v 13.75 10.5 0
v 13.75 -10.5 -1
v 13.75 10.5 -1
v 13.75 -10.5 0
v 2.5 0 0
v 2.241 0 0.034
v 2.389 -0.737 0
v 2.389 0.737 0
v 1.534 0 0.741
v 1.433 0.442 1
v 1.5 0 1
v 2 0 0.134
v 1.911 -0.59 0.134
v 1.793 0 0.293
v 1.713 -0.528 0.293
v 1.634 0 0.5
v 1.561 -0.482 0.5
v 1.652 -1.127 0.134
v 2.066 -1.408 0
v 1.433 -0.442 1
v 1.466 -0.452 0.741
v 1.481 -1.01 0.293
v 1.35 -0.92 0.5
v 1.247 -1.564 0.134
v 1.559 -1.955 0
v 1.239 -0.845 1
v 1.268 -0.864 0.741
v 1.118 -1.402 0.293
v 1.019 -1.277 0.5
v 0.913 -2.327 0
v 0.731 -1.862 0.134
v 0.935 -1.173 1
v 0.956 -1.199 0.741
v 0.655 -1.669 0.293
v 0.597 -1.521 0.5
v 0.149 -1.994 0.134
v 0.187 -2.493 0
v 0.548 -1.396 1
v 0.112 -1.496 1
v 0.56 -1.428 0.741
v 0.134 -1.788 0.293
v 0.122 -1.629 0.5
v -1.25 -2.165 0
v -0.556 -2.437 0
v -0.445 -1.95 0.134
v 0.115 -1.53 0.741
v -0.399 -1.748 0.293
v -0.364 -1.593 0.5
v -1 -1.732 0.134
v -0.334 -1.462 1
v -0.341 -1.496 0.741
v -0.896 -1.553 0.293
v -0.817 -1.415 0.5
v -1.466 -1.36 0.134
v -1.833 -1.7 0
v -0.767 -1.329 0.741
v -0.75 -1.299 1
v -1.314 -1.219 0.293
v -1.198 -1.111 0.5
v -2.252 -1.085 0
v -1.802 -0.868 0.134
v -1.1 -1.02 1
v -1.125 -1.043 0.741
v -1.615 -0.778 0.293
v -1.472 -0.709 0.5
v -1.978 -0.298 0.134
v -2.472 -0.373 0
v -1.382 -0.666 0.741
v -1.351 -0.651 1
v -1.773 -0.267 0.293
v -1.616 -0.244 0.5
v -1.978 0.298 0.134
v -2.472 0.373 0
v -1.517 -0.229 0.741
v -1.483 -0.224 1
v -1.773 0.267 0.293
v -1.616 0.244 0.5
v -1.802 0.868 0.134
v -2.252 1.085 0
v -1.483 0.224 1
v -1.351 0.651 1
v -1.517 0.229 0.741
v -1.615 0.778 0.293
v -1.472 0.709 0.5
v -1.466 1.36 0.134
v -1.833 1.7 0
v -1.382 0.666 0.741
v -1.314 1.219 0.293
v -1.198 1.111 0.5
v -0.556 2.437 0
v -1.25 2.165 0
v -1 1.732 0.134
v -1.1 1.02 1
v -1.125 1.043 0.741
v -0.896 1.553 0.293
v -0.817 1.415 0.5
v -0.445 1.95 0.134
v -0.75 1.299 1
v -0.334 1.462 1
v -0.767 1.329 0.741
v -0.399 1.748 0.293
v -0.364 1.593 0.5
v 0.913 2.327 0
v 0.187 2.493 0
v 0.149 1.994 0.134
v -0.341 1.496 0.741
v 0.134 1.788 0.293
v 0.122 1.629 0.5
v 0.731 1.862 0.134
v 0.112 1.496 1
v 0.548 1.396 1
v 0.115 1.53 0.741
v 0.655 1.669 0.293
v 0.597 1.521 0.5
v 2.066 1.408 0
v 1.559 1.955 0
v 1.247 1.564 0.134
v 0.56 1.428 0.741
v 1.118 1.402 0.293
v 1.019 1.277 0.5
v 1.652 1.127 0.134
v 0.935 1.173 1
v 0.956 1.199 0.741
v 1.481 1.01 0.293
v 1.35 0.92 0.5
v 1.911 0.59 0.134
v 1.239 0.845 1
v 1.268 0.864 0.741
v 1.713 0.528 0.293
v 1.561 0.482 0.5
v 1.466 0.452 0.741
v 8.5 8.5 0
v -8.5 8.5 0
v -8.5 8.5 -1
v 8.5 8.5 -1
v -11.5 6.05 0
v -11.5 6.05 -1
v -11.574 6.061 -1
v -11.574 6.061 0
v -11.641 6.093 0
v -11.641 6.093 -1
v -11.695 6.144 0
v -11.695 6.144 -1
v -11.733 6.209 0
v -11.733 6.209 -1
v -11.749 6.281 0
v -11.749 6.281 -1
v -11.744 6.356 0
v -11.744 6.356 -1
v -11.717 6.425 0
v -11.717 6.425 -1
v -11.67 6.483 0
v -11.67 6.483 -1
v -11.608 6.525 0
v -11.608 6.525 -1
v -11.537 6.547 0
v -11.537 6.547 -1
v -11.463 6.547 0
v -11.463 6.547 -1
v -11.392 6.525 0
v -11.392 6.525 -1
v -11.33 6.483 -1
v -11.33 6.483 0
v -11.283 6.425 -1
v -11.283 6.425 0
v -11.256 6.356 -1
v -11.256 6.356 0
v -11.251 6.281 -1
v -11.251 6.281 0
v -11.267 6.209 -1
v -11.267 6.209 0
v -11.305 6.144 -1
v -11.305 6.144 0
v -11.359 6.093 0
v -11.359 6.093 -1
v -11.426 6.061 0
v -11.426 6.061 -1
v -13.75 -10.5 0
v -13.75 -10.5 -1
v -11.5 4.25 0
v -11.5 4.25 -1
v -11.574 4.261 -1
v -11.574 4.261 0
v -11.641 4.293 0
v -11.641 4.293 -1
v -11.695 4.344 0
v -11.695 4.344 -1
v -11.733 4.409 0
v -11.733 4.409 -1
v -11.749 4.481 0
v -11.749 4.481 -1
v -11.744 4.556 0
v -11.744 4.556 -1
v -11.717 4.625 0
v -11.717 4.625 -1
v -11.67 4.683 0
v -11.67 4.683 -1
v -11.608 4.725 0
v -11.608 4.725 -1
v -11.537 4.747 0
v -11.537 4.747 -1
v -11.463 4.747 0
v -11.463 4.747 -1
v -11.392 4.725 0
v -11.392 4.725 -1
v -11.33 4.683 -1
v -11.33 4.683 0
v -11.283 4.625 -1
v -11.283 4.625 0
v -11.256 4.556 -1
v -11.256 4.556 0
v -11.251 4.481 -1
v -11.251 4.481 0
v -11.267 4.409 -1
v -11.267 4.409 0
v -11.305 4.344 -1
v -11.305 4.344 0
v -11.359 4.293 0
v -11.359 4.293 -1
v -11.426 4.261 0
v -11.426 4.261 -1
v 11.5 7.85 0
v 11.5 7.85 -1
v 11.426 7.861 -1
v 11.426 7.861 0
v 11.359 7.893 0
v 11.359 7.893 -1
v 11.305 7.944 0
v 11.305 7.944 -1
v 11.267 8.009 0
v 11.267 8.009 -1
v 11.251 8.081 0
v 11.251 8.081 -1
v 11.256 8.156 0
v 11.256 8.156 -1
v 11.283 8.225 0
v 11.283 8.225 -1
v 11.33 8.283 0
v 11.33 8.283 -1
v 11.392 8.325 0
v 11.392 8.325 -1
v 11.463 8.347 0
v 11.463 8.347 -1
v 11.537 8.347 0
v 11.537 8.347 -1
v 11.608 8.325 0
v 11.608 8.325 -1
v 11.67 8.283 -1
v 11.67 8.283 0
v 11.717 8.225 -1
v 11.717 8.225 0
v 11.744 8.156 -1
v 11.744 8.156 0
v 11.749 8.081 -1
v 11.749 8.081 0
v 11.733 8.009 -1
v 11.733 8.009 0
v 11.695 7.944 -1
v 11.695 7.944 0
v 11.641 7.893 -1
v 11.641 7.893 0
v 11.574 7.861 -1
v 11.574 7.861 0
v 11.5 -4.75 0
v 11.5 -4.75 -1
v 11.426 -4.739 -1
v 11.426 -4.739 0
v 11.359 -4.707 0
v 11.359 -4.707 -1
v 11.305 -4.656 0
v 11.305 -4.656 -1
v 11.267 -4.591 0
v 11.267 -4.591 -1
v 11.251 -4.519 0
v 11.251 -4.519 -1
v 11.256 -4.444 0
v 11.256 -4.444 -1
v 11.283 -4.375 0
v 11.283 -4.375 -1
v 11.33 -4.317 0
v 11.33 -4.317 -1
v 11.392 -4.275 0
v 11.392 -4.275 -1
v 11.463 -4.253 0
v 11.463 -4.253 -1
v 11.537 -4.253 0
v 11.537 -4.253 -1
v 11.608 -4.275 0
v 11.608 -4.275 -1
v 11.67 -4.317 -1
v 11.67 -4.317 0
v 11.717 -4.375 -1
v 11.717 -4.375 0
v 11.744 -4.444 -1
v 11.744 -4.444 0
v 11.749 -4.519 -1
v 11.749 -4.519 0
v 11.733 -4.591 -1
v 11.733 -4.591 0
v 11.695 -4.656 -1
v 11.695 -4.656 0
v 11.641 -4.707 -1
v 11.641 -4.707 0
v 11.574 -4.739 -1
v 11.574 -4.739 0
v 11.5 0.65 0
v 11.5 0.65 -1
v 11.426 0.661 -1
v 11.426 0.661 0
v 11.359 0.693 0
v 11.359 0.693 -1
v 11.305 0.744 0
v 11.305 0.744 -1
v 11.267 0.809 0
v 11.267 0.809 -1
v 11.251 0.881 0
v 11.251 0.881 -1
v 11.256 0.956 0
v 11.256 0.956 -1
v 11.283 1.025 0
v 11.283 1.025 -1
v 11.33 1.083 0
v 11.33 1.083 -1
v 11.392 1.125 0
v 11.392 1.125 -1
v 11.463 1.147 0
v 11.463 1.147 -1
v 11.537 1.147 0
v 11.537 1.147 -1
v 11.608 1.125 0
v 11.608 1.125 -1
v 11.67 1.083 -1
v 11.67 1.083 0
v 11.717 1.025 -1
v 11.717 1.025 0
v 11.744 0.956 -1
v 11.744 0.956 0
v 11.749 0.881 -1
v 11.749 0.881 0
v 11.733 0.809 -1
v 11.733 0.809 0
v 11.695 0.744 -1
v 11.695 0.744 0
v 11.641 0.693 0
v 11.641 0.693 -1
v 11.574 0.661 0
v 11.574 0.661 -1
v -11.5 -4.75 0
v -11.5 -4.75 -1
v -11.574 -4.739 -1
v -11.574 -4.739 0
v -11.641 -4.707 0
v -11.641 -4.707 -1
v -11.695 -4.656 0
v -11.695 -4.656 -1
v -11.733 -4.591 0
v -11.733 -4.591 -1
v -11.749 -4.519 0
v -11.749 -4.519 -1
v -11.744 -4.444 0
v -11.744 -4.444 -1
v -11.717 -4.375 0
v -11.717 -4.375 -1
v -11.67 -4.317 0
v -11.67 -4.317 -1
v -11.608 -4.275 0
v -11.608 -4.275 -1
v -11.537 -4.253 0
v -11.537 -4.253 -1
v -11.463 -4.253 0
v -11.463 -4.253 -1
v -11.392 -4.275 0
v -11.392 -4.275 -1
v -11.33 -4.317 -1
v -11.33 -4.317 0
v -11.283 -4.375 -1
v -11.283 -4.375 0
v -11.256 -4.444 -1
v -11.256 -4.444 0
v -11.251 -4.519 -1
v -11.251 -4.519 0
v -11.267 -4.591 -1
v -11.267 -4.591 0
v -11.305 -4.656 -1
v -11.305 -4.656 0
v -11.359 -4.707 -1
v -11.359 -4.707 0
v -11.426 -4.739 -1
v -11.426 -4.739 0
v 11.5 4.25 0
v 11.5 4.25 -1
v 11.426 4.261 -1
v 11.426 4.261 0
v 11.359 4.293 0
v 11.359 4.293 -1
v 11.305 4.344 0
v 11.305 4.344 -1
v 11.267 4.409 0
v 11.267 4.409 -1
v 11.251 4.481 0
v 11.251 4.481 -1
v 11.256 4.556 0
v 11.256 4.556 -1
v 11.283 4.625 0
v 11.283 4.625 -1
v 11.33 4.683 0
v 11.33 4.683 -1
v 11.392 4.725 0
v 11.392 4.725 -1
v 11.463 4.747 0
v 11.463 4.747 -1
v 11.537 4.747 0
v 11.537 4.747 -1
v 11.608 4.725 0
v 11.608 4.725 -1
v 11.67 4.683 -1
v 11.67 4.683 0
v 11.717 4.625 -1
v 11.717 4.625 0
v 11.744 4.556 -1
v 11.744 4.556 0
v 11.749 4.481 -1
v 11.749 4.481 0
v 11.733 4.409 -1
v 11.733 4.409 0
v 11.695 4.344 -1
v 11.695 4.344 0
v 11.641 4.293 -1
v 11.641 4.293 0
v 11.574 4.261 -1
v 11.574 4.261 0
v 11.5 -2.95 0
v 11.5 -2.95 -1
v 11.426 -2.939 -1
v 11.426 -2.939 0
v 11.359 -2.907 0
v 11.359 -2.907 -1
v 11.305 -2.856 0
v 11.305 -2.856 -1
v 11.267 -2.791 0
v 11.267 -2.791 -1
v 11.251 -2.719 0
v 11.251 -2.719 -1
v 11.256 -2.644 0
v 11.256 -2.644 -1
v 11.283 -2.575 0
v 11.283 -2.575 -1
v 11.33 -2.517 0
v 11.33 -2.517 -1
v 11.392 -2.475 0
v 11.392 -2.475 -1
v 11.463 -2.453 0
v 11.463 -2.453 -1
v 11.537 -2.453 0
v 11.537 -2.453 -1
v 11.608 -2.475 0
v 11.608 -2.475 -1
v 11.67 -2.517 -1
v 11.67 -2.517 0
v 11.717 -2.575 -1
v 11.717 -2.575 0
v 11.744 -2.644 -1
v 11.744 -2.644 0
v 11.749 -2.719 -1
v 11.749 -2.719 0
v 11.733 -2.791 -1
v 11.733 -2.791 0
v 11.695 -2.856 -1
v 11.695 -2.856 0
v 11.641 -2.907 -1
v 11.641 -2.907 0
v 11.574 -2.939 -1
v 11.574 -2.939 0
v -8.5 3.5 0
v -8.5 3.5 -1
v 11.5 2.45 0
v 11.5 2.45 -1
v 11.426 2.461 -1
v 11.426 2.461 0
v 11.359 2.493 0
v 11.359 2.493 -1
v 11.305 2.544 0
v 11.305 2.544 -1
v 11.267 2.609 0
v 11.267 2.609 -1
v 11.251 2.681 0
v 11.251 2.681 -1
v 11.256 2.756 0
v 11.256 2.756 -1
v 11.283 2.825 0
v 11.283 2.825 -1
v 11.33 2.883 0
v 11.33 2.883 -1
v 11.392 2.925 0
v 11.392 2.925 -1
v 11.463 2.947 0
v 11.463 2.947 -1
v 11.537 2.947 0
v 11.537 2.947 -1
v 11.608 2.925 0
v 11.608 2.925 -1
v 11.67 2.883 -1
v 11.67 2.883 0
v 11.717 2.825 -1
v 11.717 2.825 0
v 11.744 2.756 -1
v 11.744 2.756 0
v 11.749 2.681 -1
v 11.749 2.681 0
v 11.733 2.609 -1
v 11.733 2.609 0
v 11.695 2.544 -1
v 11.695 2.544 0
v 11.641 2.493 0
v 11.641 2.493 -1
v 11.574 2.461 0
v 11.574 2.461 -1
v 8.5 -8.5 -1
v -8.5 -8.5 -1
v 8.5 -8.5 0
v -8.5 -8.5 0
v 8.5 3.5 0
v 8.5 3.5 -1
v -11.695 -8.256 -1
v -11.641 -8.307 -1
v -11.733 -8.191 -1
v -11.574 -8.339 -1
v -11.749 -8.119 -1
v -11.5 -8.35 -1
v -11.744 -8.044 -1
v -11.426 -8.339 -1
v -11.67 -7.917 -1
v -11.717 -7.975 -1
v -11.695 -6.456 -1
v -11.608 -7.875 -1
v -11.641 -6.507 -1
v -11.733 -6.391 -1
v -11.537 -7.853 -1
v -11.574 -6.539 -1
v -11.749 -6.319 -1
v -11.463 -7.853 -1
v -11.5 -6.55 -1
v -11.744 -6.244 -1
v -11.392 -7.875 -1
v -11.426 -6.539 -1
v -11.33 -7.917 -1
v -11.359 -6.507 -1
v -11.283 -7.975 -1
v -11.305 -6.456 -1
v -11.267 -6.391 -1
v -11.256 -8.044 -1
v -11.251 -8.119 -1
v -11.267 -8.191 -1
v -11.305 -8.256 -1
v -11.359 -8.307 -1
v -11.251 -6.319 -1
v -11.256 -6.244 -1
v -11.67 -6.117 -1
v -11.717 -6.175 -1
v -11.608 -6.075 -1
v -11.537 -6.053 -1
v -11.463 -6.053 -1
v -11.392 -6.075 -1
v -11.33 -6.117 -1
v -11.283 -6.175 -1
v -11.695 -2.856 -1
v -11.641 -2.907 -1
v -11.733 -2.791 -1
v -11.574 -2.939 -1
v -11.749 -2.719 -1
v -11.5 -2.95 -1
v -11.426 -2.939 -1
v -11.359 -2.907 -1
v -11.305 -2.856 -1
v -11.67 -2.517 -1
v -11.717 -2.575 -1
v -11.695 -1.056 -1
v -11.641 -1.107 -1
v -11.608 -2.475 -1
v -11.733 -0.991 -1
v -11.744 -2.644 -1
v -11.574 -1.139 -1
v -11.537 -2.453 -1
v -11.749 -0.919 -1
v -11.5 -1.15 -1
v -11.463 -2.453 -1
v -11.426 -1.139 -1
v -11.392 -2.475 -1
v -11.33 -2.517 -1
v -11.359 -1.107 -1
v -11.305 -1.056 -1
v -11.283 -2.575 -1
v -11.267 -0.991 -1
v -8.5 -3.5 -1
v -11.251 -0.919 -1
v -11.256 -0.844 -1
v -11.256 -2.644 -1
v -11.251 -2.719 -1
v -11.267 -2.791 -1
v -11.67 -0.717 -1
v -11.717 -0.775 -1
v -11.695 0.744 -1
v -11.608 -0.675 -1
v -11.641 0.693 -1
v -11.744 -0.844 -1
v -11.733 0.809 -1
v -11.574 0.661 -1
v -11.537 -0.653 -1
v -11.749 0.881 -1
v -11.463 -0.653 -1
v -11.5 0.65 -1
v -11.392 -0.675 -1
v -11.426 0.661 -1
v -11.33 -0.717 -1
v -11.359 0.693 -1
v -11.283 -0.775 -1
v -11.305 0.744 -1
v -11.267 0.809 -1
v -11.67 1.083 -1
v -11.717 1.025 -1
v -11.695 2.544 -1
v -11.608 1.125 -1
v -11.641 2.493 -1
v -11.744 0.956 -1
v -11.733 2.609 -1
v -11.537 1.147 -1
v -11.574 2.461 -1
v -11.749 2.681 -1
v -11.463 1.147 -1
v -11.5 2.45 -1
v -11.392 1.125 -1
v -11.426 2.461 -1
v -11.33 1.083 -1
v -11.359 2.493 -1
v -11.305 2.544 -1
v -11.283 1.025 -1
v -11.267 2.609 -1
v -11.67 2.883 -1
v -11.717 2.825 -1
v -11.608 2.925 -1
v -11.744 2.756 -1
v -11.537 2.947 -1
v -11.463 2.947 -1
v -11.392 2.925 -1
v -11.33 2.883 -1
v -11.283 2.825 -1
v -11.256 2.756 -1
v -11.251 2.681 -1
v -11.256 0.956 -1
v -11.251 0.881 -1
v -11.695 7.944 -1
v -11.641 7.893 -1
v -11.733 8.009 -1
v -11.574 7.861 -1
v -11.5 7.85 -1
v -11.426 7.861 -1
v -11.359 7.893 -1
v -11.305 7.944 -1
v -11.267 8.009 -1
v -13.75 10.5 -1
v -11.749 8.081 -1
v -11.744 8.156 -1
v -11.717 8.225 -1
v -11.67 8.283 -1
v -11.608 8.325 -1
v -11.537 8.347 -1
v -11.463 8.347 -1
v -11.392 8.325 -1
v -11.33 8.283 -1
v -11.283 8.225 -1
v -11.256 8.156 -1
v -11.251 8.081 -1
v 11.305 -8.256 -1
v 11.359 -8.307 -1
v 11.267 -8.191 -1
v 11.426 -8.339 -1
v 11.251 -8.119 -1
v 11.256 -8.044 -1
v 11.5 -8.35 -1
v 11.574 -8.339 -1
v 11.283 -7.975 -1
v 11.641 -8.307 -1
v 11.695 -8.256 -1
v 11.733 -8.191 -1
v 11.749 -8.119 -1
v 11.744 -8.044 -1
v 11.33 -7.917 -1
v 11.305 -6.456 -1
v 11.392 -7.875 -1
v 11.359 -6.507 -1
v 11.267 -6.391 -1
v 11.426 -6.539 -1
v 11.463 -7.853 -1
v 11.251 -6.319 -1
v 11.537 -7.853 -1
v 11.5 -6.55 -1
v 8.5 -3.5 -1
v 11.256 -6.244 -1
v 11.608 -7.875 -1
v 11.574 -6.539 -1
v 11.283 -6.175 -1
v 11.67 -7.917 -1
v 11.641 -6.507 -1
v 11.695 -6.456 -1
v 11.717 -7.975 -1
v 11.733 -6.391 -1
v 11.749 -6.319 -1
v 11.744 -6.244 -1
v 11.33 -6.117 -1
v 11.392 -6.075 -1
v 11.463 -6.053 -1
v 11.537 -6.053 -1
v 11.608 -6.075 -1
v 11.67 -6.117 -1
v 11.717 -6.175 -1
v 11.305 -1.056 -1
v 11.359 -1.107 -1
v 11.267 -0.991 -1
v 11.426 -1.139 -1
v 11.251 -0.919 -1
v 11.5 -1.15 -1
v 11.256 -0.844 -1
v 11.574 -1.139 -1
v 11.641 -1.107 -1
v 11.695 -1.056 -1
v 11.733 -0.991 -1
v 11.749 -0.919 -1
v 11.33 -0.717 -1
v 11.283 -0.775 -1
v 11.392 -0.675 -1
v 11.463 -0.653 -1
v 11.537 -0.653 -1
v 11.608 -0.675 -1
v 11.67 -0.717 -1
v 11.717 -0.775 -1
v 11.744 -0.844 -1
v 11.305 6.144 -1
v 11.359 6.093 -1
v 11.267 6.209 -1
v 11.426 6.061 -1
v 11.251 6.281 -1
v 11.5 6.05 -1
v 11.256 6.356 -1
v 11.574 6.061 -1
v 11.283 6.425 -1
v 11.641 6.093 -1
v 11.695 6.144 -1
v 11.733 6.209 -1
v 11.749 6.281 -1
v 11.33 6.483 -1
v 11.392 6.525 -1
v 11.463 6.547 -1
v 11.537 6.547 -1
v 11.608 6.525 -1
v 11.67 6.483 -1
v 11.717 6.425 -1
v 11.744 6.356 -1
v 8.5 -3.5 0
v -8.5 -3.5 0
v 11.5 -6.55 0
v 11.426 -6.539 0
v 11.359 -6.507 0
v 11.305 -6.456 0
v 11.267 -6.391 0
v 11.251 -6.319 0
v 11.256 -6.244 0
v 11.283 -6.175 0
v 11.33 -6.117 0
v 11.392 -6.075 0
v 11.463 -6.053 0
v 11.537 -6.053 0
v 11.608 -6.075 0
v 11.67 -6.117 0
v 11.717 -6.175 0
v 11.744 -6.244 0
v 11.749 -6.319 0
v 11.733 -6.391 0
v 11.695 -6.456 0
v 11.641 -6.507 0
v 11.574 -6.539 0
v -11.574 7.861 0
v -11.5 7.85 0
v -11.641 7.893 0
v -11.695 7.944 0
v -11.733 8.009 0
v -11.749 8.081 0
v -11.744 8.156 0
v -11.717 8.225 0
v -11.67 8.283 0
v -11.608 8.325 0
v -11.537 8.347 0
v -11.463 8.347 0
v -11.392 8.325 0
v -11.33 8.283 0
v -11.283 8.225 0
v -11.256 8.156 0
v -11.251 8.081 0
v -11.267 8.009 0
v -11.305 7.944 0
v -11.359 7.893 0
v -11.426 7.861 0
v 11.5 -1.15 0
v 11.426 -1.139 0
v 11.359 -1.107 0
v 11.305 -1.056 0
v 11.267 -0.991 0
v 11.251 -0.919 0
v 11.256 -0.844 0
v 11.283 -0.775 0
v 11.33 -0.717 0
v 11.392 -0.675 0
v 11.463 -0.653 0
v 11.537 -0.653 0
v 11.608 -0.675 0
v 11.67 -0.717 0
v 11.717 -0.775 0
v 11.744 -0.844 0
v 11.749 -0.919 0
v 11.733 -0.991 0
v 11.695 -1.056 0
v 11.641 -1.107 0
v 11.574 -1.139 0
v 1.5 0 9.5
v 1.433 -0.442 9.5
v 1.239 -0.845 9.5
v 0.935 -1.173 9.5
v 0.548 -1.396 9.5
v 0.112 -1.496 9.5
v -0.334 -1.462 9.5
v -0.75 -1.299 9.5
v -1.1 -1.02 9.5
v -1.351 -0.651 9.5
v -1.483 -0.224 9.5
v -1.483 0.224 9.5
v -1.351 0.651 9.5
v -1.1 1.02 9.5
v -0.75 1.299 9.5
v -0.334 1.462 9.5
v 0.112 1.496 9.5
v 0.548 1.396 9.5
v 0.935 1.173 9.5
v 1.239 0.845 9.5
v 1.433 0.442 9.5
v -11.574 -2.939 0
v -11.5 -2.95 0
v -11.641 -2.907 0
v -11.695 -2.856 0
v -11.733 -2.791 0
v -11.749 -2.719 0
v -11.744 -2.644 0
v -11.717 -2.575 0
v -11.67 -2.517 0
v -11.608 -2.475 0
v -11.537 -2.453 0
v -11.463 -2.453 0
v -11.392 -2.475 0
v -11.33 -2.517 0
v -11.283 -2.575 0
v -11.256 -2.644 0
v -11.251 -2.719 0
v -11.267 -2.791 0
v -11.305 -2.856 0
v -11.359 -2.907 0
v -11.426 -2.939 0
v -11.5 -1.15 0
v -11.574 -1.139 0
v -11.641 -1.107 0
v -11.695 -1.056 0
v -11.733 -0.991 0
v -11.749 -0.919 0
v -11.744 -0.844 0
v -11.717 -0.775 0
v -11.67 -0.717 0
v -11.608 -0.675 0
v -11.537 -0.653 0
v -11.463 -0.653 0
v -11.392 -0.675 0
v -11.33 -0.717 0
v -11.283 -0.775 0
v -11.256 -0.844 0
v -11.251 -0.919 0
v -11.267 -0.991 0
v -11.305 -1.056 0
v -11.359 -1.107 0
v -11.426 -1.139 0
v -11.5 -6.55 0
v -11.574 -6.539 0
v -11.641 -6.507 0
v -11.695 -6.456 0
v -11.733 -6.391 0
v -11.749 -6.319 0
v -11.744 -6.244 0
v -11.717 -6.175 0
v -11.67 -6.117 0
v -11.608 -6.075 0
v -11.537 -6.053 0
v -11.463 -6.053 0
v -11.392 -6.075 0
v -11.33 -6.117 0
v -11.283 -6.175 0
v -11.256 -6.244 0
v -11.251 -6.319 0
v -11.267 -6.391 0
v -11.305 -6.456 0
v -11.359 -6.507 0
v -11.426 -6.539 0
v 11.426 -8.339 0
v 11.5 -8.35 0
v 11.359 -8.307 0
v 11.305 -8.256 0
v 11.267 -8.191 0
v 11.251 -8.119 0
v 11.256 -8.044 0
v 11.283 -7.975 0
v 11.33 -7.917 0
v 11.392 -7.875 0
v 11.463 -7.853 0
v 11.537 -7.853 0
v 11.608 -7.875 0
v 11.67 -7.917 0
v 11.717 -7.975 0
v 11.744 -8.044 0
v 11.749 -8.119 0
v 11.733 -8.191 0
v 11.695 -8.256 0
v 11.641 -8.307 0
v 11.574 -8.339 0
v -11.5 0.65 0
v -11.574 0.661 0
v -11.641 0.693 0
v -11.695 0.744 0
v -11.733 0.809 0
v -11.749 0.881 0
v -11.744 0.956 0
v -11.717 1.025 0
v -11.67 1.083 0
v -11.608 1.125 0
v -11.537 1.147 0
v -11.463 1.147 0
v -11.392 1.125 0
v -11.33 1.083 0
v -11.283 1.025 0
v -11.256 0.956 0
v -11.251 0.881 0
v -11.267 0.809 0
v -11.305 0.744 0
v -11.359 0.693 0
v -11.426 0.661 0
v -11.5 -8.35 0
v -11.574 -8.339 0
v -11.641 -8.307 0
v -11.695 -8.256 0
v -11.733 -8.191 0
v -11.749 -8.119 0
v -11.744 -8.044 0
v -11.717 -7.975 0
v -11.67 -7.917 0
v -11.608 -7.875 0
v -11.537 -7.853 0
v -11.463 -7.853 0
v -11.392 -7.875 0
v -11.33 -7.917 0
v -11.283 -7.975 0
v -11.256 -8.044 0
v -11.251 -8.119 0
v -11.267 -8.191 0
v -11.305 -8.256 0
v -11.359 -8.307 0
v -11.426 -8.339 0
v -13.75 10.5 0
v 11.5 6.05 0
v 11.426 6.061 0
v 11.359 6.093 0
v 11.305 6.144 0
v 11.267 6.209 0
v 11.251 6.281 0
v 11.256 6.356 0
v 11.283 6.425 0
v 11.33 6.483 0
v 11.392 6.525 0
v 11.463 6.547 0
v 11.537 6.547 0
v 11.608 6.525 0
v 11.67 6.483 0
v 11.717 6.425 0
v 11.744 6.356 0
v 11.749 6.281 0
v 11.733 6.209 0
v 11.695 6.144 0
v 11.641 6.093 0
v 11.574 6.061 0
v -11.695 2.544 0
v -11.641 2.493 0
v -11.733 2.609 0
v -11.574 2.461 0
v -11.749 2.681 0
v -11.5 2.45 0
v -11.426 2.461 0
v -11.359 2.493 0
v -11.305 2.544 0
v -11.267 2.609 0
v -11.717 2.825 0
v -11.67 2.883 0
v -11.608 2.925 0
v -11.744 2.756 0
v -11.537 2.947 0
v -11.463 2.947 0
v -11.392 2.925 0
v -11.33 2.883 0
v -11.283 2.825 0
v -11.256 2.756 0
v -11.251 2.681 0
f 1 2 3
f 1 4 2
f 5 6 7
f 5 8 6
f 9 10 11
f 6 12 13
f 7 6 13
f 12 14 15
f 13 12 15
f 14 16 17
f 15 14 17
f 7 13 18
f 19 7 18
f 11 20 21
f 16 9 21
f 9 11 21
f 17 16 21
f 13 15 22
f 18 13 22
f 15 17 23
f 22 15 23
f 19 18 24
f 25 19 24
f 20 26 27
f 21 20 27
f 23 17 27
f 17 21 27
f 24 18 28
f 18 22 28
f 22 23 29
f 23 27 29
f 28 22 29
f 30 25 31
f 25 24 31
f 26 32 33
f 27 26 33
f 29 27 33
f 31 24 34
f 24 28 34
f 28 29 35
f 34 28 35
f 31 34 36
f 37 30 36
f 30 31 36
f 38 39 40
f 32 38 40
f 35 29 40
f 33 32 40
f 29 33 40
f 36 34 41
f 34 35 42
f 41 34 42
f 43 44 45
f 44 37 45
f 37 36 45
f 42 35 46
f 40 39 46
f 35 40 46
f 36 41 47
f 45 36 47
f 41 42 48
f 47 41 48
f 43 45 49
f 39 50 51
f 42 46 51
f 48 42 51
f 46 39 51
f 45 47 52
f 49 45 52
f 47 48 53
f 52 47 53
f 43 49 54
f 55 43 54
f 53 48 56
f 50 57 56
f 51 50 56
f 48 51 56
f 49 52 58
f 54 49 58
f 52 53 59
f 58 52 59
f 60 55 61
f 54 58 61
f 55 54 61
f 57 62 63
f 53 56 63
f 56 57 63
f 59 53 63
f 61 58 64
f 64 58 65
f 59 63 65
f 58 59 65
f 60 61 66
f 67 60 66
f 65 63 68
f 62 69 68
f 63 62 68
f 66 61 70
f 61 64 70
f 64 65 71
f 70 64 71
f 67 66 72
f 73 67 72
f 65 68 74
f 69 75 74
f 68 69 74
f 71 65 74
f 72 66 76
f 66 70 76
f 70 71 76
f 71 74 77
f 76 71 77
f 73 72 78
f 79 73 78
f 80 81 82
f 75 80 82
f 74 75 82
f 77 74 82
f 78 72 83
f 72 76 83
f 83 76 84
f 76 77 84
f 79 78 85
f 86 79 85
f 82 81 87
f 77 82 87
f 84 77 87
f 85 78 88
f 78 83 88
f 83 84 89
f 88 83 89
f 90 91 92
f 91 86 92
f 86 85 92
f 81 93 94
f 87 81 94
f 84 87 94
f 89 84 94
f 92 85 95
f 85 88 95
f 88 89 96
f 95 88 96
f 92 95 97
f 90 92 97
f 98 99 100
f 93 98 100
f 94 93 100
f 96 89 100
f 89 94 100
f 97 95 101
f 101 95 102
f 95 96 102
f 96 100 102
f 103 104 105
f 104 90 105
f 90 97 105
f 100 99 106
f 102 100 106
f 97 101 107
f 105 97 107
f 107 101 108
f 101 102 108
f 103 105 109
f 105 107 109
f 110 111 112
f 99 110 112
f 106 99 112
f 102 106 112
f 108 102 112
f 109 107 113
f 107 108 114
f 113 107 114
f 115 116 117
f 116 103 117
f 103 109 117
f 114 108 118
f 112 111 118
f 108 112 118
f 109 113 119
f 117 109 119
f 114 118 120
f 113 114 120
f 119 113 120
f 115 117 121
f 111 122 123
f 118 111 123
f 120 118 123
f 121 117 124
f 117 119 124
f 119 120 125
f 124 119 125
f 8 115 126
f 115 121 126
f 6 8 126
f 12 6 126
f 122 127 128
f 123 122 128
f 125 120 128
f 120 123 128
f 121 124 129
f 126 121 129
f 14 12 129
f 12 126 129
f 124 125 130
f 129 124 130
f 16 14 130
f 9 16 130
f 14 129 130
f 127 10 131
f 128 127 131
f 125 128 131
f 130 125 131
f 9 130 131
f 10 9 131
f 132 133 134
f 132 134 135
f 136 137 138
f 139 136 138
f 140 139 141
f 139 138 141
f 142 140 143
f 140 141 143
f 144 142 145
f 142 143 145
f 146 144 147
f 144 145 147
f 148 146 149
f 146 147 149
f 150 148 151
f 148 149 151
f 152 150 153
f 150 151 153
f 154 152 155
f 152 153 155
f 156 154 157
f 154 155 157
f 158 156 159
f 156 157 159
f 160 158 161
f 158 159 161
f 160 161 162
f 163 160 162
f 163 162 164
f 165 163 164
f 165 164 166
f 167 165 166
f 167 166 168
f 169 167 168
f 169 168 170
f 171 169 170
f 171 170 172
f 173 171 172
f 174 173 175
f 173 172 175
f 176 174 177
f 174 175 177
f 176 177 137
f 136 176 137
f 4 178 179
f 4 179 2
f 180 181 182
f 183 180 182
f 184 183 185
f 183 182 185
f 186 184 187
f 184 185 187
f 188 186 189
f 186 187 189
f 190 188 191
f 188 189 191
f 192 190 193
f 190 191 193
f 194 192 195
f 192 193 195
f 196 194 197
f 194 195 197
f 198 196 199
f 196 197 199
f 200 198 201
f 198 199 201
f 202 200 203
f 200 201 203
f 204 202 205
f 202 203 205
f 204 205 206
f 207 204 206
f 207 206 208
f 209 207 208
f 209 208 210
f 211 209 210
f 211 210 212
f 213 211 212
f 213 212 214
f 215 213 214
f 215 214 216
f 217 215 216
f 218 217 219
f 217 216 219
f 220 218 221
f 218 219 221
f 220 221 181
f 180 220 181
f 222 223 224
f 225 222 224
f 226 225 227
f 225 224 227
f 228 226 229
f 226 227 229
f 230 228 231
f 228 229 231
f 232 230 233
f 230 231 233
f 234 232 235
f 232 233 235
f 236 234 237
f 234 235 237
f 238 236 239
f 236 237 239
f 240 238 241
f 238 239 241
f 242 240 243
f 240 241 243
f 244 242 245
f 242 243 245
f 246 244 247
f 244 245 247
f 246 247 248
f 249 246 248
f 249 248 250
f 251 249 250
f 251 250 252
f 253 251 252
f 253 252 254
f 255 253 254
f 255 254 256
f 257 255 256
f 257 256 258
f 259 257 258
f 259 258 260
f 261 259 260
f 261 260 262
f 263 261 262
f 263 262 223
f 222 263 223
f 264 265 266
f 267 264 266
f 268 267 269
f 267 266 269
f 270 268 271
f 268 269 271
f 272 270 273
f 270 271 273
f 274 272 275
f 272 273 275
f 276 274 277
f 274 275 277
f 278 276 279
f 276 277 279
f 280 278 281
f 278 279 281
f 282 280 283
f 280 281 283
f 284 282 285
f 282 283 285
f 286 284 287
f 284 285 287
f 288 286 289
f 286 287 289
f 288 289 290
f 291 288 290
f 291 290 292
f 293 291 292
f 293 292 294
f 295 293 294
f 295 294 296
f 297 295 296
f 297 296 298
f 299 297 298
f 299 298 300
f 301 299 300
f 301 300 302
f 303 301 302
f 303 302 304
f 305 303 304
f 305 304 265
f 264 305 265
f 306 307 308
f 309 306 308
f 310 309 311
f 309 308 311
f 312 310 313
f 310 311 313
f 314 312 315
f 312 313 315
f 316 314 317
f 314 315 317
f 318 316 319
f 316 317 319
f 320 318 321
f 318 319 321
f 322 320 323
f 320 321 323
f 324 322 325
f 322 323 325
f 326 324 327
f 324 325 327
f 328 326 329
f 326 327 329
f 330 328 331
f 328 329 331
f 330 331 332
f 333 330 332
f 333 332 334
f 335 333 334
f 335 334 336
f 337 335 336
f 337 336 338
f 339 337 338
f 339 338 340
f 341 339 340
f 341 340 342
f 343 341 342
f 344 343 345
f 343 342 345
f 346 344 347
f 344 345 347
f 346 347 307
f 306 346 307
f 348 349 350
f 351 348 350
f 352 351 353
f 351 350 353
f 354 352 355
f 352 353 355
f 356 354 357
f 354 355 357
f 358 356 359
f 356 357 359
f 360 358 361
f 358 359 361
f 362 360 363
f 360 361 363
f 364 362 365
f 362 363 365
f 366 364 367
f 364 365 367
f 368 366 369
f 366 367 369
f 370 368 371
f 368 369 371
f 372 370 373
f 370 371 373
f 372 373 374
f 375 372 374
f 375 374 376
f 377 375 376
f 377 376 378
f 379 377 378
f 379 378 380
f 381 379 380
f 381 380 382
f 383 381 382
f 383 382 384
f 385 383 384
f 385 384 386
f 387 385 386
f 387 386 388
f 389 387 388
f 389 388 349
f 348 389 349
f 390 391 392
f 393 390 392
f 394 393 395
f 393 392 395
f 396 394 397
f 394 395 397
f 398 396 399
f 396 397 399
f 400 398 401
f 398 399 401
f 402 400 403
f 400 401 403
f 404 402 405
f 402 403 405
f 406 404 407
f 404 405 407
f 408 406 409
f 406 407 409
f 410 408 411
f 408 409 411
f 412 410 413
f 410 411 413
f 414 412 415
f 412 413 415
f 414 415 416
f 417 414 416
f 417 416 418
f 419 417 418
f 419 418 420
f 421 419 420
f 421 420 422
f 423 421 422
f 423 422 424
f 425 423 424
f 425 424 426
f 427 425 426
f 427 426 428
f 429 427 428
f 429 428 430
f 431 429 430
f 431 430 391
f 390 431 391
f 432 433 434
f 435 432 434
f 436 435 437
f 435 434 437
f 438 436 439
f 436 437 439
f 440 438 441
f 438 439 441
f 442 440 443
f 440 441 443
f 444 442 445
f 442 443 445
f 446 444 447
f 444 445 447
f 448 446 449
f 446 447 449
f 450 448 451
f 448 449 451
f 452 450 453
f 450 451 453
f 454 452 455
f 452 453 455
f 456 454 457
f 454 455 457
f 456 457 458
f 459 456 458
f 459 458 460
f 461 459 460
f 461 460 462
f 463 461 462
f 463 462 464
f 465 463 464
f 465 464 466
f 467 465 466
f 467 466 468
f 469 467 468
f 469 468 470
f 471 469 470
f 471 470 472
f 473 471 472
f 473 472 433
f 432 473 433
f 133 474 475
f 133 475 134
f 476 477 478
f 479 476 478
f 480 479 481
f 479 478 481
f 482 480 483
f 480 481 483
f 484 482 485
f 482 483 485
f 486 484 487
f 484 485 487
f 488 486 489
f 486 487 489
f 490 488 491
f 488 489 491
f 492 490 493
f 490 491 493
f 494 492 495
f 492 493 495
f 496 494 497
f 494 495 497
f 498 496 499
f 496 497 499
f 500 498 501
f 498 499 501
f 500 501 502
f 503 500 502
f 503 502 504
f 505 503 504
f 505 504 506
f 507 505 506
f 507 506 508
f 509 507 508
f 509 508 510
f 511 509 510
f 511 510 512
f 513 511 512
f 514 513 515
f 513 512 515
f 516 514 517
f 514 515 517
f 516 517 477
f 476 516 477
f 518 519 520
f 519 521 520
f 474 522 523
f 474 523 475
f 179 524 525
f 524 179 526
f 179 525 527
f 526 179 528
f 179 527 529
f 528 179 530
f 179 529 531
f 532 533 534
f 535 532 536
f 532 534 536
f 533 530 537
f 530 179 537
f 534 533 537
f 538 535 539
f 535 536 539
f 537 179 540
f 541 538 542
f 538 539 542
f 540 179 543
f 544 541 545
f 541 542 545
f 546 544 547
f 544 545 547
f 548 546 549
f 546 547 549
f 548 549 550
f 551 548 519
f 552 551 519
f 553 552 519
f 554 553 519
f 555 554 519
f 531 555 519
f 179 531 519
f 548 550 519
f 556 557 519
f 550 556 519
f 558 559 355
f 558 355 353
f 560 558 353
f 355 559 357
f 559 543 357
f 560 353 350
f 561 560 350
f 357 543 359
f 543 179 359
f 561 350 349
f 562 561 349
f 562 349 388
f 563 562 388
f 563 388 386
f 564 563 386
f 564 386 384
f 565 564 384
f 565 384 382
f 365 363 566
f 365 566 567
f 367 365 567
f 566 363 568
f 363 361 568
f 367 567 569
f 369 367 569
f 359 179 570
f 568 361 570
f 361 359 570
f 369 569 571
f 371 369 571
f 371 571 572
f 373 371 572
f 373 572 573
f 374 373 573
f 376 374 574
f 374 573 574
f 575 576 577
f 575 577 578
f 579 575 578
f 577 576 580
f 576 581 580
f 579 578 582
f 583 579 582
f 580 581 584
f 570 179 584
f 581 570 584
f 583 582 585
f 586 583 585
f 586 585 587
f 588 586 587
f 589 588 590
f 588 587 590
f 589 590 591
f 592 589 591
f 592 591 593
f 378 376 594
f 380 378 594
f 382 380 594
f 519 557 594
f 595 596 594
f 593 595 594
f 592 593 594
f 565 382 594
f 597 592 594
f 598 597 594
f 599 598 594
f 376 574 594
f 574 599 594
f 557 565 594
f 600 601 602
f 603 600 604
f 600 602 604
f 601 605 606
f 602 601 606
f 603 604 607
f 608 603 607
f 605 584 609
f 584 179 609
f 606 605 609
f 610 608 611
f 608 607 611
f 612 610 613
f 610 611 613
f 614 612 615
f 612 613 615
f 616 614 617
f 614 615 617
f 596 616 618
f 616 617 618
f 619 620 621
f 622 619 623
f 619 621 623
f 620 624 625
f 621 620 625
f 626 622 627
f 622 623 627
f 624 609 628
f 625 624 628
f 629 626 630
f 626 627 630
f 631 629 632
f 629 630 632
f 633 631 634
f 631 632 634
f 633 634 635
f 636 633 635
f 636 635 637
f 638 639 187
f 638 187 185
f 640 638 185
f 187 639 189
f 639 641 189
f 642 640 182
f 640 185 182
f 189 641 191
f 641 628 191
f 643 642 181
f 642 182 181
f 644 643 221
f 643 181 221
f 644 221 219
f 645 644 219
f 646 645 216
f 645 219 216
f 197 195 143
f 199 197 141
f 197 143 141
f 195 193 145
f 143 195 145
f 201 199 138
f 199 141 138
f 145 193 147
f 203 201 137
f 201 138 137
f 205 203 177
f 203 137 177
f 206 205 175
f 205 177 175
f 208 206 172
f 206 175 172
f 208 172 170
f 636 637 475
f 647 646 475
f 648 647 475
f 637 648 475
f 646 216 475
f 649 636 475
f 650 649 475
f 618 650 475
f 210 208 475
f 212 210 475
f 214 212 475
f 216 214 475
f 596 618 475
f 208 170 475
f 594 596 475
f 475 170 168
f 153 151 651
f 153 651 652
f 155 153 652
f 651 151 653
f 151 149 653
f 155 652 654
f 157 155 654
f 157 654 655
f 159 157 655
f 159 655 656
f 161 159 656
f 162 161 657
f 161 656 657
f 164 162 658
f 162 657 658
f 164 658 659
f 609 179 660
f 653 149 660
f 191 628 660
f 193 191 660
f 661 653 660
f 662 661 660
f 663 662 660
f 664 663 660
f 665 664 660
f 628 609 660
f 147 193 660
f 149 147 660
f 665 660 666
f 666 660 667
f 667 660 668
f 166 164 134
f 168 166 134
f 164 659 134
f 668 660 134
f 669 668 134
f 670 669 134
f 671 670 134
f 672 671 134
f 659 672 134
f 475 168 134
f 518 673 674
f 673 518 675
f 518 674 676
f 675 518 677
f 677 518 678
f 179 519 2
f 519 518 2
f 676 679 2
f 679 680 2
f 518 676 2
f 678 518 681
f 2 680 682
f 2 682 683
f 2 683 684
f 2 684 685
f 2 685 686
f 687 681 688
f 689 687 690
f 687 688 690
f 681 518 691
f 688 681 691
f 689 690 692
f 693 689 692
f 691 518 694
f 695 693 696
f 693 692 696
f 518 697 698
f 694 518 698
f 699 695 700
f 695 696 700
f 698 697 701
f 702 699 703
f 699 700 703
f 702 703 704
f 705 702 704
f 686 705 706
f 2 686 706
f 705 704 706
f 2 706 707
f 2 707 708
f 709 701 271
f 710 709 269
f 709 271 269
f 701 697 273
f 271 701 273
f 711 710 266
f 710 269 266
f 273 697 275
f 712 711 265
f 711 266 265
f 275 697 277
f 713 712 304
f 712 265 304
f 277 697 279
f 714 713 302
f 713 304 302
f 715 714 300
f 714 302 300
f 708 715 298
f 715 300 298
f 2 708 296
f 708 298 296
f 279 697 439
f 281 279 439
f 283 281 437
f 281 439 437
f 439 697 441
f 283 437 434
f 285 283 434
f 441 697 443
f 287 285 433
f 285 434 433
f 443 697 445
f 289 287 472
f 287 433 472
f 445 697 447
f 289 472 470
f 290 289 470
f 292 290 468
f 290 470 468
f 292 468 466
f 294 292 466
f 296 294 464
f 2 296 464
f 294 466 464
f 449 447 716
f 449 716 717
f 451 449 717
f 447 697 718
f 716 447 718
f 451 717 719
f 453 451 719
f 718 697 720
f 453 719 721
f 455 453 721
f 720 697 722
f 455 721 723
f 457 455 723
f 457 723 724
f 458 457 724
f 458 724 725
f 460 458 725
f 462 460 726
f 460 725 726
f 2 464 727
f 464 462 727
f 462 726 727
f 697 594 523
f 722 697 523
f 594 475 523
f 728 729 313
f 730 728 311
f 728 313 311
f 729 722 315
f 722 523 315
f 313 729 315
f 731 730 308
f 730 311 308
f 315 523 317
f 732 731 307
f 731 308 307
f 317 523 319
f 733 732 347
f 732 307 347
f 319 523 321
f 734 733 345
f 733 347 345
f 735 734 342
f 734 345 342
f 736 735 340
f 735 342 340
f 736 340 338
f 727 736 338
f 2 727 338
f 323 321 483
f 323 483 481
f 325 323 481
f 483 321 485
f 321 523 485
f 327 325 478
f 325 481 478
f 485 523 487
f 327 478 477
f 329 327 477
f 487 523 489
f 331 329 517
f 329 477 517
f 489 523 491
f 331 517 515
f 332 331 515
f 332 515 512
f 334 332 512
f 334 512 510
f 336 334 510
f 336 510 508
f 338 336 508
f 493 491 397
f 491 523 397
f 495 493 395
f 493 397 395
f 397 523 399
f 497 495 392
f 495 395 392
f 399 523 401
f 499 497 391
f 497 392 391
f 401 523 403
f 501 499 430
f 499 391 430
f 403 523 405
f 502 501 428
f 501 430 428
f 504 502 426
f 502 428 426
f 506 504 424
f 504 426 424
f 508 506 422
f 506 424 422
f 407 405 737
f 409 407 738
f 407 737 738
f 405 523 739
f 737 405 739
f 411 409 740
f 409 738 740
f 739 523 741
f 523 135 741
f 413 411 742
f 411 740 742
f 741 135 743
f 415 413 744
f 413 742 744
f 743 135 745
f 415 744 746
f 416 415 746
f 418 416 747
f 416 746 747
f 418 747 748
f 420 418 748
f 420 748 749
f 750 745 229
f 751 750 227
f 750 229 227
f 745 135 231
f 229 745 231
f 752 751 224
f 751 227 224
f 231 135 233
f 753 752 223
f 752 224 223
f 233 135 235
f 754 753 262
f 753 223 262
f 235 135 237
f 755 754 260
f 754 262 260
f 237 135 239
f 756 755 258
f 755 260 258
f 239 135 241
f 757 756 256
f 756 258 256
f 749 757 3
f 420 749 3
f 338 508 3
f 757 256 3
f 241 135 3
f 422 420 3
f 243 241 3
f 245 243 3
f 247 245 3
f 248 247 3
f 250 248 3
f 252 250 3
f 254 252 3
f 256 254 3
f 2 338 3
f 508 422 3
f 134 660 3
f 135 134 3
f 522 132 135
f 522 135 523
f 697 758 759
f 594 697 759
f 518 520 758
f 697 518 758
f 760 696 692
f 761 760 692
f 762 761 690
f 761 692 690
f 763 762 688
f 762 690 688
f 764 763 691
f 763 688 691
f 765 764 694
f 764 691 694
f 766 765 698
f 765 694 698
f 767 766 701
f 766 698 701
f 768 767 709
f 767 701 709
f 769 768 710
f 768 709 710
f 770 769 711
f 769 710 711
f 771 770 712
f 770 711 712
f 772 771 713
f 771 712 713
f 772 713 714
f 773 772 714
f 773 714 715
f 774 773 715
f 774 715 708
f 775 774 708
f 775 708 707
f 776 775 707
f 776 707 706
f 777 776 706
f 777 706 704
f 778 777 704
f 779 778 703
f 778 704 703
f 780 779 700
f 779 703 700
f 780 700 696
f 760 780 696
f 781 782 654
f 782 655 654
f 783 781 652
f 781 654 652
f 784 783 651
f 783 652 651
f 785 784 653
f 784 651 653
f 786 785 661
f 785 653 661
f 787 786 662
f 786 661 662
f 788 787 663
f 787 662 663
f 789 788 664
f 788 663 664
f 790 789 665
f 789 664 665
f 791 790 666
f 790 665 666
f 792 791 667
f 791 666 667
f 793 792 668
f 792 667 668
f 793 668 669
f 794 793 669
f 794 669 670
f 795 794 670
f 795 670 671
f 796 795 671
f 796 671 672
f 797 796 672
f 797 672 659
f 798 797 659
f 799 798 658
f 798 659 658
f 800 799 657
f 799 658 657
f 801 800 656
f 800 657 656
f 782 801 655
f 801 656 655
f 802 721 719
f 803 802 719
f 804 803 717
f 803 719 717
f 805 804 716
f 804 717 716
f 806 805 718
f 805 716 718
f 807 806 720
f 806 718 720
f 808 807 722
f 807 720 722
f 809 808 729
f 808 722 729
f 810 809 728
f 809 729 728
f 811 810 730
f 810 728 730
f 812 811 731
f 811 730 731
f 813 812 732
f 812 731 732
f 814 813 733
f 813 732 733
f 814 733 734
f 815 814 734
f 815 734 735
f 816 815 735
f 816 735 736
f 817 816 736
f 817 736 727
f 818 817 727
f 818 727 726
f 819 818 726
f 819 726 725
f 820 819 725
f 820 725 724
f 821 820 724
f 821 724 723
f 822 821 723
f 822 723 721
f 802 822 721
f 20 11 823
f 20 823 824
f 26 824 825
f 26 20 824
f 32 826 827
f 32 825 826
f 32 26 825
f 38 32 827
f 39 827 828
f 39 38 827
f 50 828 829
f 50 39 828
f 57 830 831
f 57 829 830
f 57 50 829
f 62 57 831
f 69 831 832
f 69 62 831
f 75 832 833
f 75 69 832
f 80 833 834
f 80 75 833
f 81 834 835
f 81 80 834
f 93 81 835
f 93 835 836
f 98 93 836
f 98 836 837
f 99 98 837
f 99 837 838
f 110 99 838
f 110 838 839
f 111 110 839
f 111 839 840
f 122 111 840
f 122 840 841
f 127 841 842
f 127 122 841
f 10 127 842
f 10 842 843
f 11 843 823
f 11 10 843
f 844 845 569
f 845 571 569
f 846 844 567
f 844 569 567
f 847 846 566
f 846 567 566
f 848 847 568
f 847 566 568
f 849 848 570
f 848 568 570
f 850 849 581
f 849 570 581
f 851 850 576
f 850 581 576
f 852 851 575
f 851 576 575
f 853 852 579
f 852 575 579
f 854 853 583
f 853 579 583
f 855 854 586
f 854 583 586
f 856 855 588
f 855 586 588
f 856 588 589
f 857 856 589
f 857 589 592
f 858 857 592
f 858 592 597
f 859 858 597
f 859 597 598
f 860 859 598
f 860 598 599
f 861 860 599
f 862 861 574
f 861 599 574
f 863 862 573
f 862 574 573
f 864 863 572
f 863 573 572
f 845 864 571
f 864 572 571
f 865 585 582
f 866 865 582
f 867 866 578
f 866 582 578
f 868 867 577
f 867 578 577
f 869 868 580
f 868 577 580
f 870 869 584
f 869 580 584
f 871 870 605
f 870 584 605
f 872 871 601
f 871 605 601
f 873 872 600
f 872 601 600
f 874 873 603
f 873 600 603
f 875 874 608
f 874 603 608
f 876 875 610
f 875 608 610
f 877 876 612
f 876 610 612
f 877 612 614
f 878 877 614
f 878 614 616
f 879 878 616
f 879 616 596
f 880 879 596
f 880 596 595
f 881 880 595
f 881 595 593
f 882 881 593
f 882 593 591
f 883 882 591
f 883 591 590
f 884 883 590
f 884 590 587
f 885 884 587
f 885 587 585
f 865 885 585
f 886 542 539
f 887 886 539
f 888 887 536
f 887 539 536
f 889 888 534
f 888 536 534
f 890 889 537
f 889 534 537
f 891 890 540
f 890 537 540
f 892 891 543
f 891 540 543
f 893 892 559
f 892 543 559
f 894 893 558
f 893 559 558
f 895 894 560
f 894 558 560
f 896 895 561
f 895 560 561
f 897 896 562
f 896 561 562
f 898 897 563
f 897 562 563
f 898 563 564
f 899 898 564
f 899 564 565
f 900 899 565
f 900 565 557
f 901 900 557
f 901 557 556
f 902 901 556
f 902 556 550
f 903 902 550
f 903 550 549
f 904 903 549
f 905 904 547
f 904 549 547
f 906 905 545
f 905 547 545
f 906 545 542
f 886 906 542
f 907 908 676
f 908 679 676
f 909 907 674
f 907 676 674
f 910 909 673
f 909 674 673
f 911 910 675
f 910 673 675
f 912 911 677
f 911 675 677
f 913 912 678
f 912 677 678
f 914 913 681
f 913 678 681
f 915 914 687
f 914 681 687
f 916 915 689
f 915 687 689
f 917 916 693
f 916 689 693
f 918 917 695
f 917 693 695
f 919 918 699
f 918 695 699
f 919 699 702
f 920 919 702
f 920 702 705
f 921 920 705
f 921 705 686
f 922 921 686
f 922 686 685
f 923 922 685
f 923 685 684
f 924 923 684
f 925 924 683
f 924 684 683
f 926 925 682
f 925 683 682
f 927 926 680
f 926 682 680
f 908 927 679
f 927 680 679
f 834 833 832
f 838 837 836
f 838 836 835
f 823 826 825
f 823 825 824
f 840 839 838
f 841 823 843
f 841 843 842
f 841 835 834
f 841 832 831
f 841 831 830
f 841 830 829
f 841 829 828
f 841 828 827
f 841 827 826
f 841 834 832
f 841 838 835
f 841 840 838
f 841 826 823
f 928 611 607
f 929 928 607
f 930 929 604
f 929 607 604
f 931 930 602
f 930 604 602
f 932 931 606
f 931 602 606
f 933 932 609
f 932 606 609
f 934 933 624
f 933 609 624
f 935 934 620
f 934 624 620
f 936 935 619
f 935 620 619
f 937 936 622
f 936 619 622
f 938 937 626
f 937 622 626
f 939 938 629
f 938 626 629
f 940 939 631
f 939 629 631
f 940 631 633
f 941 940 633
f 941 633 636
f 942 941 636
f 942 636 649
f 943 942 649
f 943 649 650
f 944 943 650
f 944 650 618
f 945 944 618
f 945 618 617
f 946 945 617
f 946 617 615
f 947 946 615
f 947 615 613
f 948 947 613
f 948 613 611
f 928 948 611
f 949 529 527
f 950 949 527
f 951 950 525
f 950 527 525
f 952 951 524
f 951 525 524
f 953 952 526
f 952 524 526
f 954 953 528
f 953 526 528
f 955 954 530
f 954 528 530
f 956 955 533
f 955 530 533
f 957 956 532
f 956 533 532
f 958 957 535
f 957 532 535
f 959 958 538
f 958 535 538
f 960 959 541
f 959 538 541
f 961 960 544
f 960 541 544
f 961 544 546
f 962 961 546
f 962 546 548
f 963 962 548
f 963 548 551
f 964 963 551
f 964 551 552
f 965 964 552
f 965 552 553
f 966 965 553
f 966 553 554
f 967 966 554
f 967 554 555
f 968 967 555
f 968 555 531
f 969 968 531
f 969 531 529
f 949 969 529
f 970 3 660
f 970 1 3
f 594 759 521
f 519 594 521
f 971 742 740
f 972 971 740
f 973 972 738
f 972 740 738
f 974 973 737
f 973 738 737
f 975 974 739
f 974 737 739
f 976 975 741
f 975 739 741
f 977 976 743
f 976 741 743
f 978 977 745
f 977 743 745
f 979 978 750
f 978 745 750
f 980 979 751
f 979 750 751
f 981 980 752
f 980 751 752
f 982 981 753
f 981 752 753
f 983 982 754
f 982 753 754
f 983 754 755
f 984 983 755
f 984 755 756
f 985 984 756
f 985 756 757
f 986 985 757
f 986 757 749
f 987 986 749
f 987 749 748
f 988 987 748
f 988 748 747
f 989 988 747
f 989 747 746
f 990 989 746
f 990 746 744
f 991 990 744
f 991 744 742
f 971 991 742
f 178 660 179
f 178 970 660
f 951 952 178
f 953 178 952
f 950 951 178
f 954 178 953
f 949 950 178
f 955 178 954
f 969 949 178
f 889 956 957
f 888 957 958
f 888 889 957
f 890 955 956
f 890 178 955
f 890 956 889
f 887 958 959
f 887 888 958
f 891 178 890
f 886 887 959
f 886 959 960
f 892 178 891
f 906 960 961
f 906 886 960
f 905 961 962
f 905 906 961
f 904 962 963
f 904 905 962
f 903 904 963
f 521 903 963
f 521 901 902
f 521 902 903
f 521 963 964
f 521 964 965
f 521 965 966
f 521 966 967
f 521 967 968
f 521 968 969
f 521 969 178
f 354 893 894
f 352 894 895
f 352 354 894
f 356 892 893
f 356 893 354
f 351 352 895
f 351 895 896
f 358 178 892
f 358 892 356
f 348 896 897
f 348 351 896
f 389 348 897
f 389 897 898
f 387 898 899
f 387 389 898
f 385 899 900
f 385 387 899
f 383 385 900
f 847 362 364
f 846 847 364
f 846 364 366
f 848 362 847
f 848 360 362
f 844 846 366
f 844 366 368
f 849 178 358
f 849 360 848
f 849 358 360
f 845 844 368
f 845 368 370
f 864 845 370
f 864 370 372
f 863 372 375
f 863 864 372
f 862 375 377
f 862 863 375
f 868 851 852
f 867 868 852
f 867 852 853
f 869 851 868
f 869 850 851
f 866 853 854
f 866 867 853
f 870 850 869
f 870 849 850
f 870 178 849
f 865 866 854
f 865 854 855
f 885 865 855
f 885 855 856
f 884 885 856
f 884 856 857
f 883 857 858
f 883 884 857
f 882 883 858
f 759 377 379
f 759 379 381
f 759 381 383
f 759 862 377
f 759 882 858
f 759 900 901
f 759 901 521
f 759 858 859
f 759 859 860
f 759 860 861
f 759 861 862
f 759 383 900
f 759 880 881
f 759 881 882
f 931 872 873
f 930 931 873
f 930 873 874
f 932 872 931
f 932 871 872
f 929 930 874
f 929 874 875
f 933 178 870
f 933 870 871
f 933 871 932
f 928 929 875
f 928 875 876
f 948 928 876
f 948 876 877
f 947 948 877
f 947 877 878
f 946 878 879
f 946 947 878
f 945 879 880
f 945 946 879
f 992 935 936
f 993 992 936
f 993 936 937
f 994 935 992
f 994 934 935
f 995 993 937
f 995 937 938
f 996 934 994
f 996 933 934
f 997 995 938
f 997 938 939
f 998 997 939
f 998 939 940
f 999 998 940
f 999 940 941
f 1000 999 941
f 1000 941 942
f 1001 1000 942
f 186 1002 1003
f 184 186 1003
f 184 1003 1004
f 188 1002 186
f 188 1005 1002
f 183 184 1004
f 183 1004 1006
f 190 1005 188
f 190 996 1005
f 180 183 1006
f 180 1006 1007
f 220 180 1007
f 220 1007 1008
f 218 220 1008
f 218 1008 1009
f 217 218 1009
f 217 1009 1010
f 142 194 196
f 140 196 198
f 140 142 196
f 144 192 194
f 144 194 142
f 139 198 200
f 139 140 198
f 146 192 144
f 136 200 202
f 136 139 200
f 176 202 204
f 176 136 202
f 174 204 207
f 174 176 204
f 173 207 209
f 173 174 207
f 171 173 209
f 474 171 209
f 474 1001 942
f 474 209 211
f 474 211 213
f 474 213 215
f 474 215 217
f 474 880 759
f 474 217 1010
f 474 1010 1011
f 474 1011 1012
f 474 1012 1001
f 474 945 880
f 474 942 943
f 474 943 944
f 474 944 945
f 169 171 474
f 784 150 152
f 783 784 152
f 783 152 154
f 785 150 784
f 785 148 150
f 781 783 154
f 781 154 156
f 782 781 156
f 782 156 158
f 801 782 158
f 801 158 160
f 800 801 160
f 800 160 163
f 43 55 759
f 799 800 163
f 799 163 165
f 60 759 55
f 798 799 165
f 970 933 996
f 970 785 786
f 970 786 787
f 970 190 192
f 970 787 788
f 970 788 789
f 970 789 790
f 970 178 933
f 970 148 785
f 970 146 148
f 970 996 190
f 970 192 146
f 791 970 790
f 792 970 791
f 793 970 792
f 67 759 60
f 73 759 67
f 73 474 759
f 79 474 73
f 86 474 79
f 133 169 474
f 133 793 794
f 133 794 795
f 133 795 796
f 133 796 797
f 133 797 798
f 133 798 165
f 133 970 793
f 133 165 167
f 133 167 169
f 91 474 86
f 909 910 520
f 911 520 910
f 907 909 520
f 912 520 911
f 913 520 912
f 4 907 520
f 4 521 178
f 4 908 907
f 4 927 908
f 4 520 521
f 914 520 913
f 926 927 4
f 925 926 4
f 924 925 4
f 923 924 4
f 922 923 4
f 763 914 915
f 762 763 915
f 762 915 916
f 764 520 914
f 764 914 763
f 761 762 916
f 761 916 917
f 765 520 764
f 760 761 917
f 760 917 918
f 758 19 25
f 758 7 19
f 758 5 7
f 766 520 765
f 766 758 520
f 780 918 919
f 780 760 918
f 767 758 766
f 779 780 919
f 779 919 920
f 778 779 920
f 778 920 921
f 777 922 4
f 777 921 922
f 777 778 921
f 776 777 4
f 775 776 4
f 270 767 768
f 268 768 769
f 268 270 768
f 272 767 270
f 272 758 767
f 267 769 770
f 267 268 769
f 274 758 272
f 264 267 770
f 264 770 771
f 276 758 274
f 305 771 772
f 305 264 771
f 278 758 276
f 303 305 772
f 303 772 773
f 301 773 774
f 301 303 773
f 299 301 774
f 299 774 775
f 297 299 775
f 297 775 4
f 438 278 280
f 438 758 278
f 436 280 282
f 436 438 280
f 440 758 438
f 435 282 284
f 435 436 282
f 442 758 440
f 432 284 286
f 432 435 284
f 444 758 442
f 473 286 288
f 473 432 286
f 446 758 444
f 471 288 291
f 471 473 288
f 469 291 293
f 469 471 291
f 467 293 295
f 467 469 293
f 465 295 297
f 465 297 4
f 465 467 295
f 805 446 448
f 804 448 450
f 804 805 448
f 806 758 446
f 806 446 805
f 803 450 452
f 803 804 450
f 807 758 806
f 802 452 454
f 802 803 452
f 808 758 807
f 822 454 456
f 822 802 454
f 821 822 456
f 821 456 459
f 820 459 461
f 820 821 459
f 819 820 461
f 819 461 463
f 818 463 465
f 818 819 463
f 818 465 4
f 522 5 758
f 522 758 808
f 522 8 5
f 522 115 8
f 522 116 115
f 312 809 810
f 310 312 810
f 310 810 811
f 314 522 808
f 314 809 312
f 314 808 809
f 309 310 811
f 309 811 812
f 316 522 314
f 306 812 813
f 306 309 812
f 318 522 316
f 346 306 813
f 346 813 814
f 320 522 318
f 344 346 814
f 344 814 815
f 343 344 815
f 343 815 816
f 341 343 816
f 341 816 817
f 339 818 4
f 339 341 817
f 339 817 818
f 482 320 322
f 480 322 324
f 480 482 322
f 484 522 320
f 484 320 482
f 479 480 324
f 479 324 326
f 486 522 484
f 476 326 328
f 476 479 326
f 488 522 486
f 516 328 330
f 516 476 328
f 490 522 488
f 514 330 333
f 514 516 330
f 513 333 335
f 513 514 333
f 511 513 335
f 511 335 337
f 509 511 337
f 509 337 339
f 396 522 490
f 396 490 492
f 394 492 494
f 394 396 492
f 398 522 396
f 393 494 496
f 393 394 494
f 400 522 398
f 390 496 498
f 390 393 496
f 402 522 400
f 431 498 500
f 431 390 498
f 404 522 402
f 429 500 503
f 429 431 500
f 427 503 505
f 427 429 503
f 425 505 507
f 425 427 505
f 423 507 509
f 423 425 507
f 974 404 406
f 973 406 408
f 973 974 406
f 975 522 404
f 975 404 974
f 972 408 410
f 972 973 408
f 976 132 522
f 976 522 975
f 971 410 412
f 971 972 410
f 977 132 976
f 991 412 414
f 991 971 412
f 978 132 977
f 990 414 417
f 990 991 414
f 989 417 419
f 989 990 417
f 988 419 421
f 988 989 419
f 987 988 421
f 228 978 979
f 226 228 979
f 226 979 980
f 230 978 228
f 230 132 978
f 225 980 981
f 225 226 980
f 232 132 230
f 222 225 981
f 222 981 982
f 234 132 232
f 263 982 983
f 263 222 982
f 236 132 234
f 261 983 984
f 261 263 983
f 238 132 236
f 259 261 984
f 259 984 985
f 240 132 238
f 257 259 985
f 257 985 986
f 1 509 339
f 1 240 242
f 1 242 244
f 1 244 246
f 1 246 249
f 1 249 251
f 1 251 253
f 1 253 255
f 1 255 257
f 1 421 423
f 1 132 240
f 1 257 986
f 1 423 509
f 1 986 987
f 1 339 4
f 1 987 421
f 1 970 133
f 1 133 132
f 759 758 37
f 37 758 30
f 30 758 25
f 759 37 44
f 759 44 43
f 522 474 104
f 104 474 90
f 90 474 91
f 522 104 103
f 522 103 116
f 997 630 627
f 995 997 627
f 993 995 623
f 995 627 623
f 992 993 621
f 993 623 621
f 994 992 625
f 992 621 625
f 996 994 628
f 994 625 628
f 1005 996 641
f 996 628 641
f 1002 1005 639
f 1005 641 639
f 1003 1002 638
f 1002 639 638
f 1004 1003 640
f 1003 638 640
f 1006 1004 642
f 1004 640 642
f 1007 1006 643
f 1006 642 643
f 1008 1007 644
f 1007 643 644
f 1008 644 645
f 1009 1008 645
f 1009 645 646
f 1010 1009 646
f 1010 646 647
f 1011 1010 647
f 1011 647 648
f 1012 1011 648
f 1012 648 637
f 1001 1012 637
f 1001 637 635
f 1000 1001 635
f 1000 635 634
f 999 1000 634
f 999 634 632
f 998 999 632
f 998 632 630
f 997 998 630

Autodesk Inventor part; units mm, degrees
ref_plane "YZ Plane" through (0, 0, 0) normal (1, 0, 0) x (0, 1, 0)
ref_plane "XZ Plane" through (0, 0, 0) normal (0, 1, 0) x (-1, 0, 0)
ref_plane "XY Plane" through (0, 0, 0) normal (0, 0, 1) x (1, 0, 0)
sketch "Sketch1" plane through (0, 0, 0) normal (0, 0, 1) x (1, 0, 0)
  line L0 (-13.75, -10.5) -> (13.75, -10.5)
  line L1 (13.75, -10.5) -> (13.75, 10.5)
  line L2 (13.75, 10.5) -> (-13.75, 10.5)
  line L3 (-13.75, 10.5) -> (-13.75, -10.5)
  line L4 (-13.75, -10.5) -> (13.75, 10.5) construction
  line L5 (13.75, -10.5) -> (-13.75, 10.5) construction
  line L6 (-8.5, 8.5) -> (8.5, 8.5)
  line L7 (8.5, 8.5) -> (8.5, 3.5)
  line L8 (8.5, 3.5) -> (-8.5, 3.5)
  line L9 (-8.5, 3.5) -> (-8.5, 8.5)
  line L10 (-8.5, 8.5) -> (8.5, 3.5) construction
  line L11 (8.5, 8.5) -> (-8.5, 3.5) construction
  line L12 (-19.25, 0) -> (19.25, 0) construction
  line L13 (-8.5, -8.5) -> (8.5, -8.5)
  line L14 (8.5, -8.5) -> (8.5, -3.5)
  line L15 (8.5, -3.5) -> (-8.5, -3.5)
  line L16 (-8.5, -3.5) -> (-8.5, -8.5)
  line L17 (0, -14.7) -> (0, 14.7) construction
  circle A0 centre (0, 0) radius 1.5
  point P0 (0, 6)
  point P1 (8.5, 6)
  point P2 (11.5, -8.1)
  point P3 (11.5, -6.3)
  point P4 (11.5, -4.5)
  point P5 (11.5, -0.9)
  point P6 (11.5, -2.7)
  point P7 (11.5, 8.1)
  point P8 (11.5, 6.3)
  point P9 (11.5, 4.5)
  point P10 (11.5, 0.9)
  point P11 (11.5, 2.7)
  point P12 (-11.5, -8.1)
  point P13 (-11.5, -6.3)
  point P14 (-11.5, -4.5)
  point P15 (-11.5, -0.9)
  point P16 (-11.5, -2.7)
  point P17 (-11.5, 8.1)
  point P18 (-11.5, 6.3)
  point P19 (-11.5, 4.5)
  point P20 (-11.5, 2.7)
  point P21 (-11.5, 0.9)
  dimension "d0" = 21
  dimension "d1" = 27.5
  dimension "d28" = 17
  dimension "d29" = 5
  dimension "d30" = 2
  dimension "d31" = 1.8
  dimension "d32" = 1.8
  dimension "d33" = 1.8
  dimension "d34" = 1.8
  dimension "d35" = 0.9
  dimension "d36" = 2.25
  dimension "d44" = 3
extrude "Extrusion1" add sketch "Sketch1" against normal blind 1 contours L3 L2 L1 L0 | A0
hole "Hole2" at (11.5, -8.1, 0) at (11.5, -6.3, 0) at (11.5, -4.5, 0) at (11.5, -0.9, 0) at (11.5, -2.7, 0) at (11.5, 8.1, 0) at (11.5, 6.3, 0) at (11.5, 4.5, 0) at (11.5, 2.7, 0) at (11.5, 0.9, 0) at (-11.5, 8.1, 0) at (-11.5, 6.3, 0) at (-11.5, 4.5, 0) at (-11.5, 2.7, 0) at (-11.5, 0.9, 0) at (-11.5, -0.9, 0) at (-11.5, -2.7, 0) at (-11.5, -4.5, 0) at (-11.5, -6.3, 0) at (-11.5, -8.1, 0) direction (0, 0, -1) diameter 0.5 end through all
extrude "Extrusion3" add sketch "Sketch1" along normal blind 9.5 contours A0
thread "Thread3" size "M3x0.5" class "6g" standard "ANSI Metric M Profile" length 4.5
fillet "Fillet3" radius 1 1 edges at (-1.5, 0, 0)
properties part number "Soporte"
